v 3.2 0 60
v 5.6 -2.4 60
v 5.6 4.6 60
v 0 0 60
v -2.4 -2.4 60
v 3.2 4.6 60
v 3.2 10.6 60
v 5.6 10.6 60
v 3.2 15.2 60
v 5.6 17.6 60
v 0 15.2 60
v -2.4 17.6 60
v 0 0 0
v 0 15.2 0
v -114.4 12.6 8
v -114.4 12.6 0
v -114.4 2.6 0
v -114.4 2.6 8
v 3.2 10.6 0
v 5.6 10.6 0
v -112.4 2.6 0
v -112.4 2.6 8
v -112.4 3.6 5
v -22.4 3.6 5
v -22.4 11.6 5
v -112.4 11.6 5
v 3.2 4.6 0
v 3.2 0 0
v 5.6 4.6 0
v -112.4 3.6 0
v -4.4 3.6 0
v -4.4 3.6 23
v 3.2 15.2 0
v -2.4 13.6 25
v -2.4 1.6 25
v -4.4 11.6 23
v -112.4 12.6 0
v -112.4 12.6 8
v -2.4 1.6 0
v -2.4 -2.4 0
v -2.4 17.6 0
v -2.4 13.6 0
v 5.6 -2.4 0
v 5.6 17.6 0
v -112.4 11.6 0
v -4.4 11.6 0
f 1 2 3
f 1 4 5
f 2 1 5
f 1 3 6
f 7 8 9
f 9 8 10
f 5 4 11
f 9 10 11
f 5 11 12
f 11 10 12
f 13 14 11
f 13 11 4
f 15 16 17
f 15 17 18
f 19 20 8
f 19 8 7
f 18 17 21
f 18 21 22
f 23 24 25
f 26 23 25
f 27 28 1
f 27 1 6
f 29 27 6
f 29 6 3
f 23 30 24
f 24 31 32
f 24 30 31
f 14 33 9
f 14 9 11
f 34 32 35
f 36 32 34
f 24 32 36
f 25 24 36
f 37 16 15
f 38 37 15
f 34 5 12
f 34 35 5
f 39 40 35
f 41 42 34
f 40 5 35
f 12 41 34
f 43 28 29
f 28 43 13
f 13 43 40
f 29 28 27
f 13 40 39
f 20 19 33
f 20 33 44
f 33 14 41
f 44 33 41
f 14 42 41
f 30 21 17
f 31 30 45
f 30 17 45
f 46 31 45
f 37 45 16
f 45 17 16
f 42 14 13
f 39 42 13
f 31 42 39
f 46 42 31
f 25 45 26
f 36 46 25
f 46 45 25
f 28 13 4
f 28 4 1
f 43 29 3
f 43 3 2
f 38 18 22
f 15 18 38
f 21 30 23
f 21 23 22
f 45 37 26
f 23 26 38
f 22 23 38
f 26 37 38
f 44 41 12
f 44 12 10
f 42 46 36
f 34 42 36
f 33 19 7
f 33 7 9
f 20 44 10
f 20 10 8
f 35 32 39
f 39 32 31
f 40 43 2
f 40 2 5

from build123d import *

# Parameters (mm, degrees)
EXTRUDE_1_DEPTH     = 60
SKETCH_2_W          = 5
SKETCH_2_H          = 8
EXTRUDE_2_DEPTH     = 197
CHAMFER_1_SIZE      = 20
CHAMFER_2_SIZE      = 2
SKETCH_4_W          = 85
SKETCH_4_H          = 8
CUT_EXTRUDE_1_DEPTH = 10
SKETCH_5_W          = 8
SKETCH_5_H          = 10
EXTRUDE_3_DEPTH     = 2


with BuildPart() as part:
    # 草图1 → 凸台-拉伸1 (new body)
    with BuildSketch(Plane.XY):
        Polygon((5.6, 10.6), (3.2, 10.6), (3.2, 15.2), (0, 15.2), (0, 0), (3.2, 0), (3.2, 4.6), (5.6, 4.6), (5.6, -2.4), (-2.4, -2.4), (-2.4, 17.6), (5.6, 17.6), align=None)
    extrude(amount=EXTRUDE_1_DEPTH)

    # 草图2 → 凸台-拉伸2 (add)
    with BuildSketch(Plane.ZY.offset(2.4)):
        with Locations((2.5, 7.6)):
            Rectangle(SKETCH_2_W, SKETCH_2_H)
    extrude(amount=EXTRUDE_2_DEPTH)

    # 倒角1
    chamfer_1_edges = [part.edges().sort_by_distance(p)[0] for p in [
        (-2.4, 7.6, 5),
    ]]
    chamfer(chamfer_1_edges, length=CHAMFER_1_SIZE)

    # 倒角2
    chamfer_2_edges = [part.edges().sort_by_distance(p)[0] for p in [
        (-2.4, 3.6, 15),
        (-2.4, 11.6, 15),
    ]]
    chamfer(chamfer_2_edges, length=CHAMFER_2_SIZE)

    # 草图4 → 切除-拉伸1 (cut)
    with BuildSketch(Plane(origin=(0, 0, 0), x_dir=(-1, 0, 0), z_dir=(0, 0, -1))):
        with Locations((156.9, 7.6)):
            Rectangle(SKETCH_4_W, SKETCH_4_H)
    extrude(amount=-CUT_EXTRUDE_1_DEPTH, mode=Mode.SUBTRACT)

    # 草图5 → 凸台-拉伸3 (add)
    with BuildSketch(Plane.ZY.offset(114.4)):
        with Locations((4, 7.6)):
            Rectangle(SKETCH_5_W, SKETCH_5_H)
    extrude(amount=-EXTRUDE_3_DEPTH)


solid = part.part
